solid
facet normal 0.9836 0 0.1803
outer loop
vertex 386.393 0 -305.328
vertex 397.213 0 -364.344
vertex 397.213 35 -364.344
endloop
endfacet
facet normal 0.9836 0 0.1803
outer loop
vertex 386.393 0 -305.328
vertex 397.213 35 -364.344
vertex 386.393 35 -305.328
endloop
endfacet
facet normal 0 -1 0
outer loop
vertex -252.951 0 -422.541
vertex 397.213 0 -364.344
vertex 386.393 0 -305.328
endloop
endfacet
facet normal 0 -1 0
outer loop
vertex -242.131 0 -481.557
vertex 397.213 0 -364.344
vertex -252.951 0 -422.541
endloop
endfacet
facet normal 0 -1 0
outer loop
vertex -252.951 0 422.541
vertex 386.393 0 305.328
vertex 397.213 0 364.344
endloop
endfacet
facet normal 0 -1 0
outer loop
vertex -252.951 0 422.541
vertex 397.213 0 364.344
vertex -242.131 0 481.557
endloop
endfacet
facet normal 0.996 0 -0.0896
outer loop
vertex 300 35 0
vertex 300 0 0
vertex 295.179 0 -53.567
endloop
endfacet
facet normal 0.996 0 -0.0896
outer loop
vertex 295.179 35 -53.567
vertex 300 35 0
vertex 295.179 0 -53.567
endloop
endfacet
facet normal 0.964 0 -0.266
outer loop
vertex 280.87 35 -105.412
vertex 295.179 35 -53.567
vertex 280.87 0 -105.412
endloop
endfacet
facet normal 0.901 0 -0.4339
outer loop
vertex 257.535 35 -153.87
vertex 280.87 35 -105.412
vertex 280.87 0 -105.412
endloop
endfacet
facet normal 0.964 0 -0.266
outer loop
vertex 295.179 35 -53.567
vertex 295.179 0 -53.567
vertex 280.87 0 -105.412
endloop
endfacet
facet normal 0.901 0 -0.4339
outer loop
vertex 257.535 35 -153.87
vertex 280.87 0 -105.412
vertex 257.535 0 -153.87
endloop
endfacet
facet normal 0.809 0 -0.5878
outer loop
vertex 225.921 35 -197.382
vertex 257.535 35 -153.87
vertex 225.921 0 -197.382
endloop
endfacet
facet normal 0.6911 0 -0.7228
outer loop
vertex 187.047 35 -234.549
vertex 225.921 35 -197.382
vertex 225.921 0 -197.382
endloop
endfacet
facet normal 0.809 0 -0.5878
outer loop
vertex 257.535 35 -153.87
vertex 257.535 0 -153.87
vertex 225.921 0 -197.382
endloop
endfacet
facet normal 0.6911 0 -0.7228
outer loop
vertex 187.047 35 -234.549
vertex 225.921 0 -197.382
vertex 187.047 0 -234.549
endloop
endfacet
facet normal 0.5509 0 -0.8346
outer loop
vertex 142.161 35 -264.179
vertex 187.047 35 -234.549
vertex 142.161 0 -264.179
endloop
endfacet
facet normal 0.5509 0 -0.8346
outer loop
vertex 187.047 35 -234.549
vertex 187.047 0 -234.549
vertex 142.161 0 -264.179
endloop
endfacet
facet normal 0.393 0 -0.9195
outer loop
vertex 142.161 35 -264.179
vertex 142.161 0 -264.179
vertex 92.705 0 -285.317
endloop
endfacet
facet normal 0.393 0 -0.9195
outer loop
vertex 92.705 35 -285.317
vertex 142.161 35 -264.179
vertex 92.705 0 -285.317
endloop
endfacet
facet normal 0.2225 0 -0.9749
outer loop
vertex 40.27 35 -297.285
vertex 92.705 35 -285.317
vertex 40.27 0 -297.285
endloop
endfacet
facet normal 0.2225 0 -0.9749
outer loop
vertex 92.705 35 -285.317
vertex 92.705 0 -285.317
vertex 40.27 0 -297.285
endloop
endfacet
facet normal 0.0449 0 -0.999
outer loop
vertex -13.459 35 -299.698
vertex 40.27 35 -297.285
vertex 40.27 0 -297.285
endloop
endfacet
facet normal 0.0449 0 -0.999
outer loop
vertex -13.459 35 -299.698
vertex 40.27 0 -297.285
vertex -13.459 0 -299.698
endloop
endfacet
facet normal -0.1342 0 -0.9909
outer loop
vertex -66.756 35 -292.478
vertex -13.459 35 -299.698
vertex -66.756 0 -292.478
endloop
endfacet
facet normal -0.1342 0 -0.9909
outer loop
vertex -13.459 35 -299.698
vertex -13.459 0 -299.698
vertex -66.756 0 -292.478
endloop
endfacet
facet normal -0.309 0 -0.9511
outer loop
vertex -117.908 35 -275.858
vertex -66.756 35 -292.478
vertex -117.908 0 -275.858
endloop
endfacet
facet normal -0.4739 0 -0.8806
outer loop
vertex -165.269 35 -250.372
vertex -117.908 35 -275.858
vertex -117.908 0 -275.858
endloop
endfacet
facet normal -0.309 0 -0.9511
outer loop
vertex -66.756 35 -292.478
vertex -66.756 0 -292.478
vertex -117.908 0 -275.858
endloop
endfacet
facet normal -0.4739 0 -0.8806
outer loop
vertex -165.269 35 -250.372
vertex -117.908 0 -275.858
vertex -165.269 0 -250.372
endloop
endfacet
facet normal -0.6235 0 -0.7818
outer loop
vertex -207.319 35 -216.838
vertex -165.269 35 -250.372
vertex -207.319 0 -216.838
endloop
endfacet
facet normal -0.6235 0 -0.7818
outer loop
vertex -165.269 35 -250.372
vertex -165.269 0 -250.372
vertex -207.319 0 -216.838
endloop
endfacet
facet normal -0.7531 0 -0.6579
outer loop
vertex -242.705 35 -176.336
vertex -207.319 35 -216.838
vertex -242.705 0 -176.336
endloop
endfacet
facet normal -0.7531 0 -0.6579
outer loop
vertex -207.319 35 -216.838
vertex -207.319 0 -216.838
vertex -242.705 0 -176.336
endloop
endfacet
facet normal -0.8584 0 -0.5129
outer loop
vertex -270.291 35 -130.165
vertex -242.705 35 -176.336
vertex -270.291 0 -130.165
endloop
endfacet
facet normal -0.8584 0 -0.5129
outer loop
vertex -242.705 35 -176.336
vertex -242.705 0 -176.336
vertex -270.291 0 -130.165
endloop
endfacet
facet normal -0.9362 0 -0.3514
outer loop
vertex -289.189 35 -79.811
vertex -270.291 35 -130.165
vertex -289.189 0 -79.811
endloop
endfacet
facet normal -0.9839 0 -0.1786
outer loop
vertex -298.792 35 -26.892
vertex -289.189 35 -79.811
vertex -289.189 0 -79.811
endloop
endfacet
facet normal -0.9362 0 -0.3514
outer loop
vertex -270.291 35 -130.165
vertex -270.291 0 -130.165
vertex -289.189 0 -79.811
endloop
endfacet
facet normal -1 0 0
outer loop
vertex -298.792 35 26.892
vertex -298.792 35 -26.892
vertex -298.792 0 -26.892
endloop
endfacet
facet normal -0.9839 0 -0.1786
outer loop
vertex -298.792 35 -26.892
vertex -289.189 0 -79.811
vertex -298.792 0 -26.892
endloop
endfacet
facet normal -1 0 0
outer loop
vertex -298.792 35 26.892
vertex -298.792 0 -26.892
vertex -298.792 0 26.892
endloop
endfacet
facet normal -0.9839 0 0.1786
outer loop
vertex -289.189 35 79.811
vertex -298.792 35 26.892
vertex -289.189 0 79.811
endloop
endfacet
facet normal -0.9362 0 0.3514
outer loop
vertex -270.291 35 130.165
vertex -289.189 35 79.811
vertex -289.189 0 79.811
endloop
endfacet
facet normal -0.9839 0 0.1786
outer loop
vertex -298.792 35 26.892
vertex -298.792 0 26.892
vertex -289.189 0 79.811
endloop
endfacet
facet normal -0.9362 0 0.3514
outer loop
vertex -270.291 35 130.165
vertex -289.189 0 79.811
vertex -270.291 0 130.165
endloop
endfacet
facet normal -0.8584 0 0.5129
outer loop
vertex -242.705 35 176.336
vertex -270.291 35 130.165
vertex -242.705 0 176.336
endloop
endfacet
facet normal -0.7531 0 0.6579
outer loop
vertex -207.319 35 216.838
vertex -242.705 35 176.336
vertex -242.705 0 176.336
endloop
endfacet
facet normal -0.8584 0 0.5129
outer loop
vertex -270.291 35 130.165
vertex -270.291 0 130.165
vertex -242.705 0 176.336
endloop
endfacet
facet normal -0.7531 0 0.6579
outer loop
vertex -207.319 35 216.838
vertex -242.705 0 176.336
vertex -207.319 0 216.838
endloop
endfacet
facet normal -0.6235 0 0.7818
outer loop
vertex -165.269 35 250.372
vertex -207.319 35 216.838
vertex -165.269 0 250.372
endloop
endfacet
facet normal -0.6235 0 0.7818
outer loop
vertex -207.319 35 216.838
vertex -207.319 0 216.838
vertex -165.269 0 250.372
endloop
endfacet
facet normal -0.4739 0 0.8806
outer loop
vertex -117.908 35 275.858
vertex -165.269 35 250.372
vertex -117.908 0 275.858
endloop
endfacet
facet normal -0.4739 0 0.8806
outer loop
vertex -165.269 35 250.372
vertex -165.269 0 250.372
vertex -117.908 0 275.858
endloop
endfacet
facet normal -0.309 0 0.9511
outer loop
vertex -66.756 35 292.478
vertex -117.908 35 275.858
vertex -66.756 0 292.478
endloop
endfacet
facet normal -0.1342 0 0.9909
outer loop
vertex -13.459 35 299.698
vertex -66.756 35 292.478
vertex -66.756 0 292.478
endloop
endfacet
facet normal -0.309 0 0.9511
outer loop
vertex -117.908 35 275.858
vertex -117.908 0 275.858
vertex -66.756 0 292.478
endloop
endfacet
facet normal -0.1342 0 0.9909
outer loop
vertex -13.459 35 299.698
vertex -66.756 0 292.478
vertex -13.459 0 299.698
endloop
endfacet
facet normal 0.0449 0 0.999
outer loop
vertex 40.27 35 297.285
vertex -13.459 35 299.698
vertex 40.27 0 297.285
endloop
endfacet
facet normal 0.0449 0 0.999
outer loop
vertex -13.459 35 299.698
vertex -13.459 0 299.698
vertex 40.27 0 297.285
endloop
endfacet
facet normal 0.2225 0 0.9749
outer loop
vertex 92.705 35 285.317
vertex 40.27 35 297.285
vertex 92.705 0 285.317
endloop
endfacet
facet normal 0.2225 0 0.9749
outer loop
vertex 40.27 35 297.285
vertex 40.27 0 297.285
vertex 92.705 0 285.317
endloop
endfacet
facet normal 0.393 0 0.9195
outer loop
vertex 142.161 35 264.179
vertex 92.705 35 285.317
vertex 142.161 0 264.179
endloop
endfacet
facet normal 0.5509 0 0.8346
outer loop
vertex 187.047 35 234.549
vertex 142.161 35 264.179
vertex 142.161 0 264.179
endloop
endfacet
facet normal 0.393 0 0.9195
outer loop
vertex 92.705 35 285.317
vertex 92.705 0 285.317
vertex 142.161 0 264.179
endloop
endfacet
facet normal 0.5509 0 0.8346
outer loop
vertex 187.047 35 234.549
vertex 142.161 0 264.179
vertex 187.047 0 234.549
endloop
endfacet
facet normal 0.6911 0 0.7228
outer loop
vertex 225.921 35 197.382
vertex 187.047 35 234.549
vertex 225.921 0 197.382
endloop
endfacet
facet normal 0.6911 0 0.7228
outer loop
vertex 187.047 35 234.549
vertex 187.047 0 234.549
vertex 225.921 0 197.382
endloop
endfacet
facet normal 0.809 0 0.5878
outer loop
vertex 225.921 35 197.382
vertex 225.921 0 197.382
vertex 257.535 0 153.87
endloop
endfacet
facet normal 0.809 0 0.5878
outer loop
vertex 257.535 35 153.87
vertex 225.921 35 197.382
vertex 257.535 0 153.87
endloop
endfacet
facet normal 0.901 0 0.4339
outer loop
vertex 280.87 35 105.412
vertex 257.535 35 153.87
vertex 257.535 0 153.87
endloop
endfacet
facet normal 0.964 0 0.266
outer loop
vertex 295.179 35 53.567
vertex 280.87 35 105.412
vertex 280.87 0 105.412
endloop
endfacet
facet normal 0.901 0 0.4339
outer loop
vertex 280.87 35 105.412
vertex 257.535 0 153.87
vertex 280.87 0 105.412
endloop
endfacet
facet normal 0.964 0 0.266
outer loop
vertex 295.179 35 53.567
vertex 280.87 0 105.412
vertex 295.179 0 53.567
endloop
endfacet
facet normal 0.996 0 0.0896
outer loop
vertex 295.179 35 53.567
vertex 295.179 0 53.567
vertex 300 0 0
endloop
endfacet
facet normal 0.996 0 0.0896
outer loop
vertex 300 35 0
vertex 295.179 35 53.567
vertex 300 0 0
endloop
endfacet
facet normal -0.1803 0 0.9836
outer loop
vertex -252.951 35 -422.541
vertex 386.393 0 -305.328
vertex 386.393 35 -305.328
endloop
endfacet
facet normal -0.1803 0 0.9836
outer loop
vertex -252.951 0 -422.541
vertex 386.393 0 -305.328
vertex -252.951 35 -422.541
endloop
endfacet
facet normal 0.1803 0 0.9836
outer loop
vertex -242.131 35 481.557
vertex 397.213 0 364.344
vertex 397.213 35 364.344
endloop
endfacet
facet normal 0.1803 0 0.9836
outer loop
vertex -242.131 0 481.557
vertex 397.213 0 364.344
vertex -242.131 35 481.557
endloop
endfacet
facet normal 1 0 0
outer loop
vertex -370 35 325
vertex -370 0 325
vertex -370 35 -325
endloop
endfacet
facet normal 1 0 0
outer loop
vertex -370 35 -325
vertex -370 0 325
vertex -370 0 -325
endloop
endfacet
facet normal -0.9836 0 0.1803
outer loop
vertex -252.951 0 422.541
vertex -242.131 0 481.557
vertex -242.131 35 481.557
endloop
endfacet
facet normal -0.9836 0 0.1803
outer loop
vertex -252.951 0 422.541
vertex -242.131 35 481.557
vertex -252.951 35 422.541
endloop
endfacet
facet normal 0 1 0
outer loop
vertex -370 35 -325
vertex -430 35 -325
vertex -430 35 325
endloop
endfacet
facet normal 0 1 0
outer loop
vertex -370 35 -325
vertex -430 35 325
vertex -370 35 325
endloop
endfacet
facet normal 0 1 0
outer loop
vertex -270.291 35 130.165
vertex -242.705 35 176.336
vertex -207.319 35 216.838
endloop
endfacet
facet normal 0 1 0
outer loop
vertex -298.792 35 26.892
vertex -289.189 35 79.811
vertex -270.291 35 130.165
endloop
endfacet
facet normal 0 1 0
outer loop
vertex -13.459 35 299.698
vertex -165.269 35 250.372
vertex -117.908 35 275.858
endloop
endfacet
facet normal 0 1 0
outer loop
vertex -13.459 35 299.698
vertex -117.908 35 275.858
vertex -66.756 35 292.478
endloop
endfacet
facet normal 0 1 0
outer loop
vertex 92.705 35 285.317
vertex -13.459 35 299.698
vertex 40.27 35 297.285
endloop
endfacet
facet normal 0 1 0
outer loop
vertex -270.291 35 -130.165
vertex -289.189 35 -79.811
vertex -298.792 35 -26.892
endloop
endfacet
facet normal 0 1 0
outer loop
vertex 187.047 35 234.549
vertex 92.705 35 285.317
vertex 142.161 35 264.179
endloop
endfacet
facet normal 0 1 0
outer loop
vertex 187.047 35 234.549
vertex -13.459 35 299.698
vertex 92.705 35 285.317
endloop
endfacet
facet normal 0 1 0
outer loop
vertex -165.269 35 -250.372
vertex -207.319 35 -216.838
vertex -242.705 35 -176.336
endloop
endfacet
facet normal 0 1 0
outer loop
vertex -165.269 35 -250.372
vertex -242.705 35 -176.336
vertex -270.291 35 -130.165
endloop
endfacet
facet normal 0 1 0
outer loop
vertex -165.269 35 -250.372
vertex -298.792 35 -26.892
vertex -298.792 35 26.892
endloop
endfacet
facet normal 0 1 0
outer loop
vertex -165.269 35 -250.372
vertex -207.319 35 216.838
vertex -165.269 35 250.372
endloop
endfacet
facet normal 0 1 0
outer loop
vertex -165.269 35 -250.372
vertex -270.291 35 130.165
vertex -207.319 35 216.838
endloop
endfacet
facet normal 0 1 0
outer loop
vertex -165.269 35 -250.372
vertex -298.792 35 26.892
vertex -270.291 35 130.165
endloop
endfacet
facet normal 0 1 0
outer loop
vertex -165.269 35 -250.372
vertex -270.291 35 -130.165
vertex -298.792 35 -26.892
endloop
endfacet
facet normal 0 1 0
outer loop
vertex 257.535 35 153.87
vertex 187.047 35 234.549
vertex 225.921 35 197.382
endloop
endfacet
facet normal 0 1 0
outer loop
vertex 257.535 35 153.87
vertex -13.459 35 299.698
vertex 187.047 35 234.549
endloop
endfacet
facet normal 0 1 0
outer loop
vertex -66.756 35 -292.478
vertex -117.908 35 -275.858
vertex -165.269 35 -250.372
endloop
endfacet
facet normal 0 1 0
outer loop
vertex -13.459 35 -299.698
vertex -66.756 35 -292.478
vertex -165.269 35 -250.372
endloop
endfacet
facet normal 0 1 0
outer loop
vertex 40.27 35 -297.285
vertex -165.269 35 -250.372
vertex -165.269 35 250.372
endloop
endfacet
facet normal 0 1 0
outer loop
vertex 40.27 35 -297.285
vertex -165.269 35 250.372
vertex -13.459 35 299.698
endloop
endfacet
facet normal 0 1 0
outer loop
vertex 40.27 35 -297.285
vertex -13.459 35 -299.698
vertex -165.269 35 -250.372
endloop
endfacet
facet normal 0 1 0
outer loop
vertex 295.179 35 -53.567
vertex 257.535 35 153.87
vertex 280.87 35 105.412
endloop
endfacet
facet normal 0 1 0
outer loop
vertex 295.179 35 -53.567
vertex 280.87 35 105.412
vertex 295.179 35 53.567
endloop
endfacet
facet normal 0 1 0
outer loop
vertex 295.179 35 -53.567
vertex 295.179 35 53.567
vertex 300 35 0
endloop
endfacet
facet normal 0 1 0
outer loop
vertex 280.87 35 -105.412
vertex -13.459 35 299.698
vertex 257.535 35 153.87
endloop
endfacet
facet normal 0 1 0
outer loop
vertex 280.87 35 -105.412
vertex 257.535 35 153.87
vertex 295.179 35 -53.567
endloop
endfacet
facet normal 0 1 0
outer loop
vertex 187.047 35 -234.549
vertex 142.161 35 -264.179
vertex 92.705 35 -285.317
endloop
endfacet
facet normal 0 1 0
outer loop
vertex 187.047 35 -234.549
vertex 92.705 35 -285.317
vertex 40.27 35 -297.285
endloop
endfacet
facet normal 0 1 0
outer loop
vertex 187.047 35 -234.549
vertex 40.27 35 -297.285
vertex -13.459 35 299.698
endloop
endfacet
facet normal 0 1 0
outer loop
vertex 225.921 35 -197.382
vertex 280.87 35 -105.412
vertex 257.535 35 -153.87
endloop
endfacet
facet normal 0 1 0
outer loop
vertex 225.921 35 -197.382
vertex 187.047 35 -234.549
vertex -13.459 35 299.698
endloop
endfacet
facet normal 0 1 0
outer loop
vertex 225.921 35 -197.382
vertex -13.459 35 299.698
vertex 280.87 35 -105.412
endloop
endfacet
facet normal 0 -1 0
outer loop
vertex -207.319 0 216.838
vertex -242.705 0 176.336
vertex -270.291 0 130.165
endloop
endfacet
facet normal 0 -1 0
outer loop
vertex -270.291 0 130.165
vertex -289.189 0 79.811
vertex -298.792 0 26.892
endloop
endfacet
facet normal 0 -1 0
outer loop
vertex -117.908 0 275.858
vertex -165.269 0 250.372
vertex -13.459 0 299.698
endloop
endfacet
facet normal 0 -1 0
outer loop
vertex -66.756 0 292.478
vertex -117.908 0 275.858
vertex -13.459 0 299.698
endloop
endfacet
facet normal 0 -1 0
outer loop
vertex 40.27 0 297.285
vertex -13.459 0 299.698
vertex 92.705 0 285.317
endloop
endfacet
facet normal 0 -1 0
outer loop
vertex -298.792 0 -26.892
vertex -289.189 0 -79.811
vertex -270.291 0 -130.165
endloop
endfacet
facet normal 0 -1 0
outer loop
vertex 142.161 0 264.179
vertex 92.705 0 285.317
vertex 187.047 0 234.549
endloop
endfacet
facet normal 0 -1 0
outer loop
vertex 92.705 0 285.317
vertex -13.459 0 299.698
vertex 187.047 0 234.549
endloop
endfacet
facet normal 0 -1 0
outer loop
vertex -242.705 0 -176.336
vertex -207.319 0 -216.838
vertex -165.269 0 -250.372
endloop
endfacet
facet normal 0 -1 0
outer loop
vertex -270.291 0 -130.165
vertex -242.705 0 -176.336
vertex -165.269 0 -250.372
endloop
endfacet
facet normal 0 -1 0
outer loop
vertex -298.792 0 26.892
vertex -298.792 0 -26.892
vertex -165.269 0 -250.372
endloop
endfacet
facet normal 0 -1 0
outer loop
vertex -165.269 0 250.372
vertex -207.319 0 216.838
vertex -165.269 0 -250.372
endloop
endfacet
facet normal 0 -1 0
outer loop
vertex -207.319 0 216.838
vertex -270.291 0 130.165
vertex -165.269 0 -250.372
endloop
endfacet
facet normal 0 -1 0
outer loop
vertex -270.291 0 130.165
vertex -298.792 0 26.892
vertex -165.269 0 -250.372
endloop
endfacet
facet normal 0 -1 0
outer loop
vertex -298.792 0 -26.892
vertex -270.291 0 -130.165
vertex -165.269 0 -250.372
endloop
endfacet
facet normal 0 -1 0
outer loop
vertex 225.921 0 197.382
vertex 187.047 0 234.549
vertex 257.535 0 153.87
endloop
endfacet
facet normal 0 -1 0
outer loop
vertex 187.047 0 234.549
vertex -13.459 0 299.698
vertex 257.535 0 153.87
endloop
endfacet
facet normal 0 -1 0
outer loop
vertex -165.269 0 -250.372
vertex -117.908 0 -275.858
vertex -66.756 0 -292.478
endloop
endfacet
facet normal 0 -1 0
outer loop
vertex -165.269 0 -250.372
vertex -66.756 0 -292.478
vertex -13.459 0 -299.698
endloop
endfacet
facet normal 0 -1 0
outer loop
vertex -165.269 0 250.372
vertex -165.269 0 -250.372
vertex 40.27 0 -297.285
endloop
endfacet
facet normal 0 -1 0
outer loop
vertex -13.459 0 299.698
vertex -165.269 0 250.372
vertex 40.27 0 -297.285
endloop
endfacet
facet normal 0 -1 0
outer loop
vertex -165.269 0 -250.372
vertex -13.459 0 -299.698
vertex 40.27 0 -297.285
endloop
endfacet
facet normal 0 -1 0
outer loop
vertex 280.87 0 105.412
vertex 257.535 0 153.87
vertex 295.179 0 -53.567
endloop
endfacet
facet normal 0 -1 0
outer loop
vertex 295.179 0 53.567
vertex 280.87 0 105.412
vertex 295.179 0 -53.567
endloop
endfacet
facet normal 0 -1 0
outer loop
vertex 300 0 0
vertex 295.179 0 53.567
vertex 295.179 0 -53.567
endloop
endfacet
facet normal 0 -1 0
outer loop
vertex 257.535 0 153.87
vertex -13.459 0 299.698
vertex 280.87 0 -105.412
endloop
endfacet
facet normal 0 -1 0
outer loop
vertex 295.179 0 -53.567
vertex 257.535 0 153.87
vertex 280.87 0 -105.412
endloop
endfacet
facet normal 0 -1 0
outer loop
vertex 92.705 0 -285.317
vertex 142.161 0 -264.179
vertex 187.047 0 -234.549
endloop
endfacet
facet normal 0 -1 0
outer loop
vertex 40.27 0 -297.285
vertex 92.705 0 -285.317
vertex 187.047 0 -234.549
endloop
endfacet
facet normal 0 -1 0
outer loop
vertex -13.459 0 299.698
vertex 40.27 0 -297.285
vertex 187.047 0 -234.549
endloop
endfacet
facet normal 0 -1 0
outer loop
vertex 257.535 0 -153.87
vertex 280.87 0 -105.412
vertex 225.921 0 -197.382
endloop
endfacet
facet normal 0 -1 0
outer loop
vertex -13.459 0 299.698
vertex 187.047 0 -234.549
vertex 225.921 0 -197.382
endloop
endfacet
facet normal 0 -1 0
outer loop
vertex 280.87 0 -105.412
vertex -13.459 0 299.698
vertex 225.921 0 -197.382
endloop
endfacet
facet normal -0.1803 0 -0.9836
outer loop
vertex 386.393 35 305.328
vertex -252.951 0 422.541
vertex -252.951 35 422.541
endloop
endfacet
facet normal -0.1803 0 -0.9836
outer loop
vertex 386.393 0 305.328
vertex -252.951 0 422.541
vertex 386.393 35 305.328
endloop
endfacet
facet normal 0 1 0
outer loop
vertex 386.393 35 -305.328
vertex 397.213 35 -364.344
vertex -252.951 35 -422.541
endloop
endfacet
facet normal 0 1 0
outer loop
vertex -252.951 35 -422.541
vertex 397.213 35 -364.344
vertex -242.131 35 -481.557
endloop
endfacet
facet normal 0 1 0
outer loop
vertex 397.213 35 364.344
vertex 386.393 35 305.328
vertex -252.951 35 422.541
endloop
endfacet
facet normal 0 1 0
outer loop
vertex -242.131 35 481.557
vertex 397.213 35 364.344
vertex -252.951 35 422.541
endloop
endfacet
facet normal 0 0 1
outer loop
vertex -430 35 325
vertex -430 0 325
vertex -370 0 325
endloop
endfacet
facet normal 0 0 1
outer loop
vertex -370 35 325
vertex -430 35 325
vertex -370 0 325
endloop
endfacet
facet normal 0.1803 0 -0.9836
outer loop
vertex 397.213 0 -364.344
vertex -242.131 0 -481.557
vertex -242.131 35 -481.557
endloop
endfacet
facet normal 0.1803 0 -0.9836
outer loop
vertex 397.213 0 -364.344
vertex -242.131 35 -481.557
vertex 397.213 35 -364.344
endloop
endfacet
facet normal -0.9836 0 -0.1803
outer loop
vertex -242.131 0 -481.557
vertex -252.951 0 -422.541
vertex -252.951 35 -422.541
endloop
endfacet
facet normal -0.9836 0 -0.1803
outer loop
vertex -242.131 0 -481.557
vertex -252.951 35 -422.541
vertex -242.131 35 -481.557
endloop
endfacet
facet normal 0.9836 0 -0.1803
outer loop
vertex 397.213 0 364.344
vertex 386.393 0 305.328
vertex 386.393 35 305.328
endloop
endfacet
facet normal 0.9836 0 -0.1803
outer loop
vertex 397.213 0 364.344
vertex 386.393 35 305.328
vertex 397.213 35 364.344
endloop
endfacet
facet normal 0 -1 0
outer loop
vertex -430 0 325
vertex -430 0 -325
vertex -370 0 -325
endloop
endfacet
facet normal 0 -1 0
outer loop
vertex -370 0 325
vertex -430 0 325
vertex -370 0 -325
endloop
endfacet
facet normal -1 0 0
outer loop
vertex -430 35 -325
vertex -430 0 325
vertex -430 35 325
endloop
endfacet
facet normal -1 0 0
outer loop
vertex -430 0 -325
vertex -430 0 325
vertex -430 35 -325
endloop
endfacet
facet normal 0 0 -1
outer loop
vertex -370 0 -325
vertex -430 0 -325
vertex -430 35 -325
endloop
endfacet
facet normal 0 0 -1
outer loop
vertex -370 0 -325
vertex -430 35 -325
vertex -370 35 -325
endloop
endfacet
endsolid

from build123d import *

# Parameters (mm, degrees)
SKETCH1_R             = 300
BOSS_EXTRUDE1_DEPTH   = 35
BOSS_EXTRUDE1_2_DEPTH = 35
SKETCH1_W             = 60
SKETCH1_H             = 650
BOSS_EXTRUDE1_3_DEPTH = 35
BOSS_EXTRUDE1_4_DEPTH = 35


with BuildPart() as part:
    # Sketch1 → Boss-Extrude1 (new body)
    with BuildSketch(Plane(origin=(0, 0, 0), x_dir=(1, 0, 0), z_dir=(0, 1, 0))):
        Circle(SKETCH1_R)
    extrude(amount=BOSS_EXTRUDE1_DEPTH)


with BuildPart() as body_2:
    # Sketch1 → Boss-Extrude1 2 (new body)
    with BuildSketch(Plane(origin=(0, 0, 0), x_dir=(1, 0, 0), z_dir=(0, 1, 0))):
        Polygon((386.393442623, 305.327868852), (-252.950819672, 422.540983607), (-242.131147541, 481.557377049), (397.213114754, 364.344262295), align=None)
    extrude(amount=BOSS_EXTRUDE1_2_DEPTH)


with BuildPart() as body_3:
    # Sketch1 → Boss-Extrude1 3 (new body)
    with BuildSketch(Plane(origin=(0, 0, 0), x_dir=(1, 0, 0), z_dir=(0, 1, 0))):
        with Locations((-400, 0)):
            Rectangle(SKETCH1_W, SKETCH1_H)
    extrude(amount=BOSS_EXTRUDE1_3_DEPTH)


with BuildPart() as body_4:
    # Sketch1 → Boss-Extrude1 4 (new body)
    with BuildSketch(Plane(origin=(0, 0, 0), x_dir=(1, 0, 0), z_dir=(0, 1, 0))):
        Polygon((-242.131147541, -481.557377049), (-252.950819672, -422.540983607), (386.393442623, -305.327868852), (397.213114754, -364.344262295), align=None)
    extrude(amount=BOSS_EXTRUDE1_4_DEPTH)


solid = Compound([part.part, body_2.part, body_3.part, body_4.part])
